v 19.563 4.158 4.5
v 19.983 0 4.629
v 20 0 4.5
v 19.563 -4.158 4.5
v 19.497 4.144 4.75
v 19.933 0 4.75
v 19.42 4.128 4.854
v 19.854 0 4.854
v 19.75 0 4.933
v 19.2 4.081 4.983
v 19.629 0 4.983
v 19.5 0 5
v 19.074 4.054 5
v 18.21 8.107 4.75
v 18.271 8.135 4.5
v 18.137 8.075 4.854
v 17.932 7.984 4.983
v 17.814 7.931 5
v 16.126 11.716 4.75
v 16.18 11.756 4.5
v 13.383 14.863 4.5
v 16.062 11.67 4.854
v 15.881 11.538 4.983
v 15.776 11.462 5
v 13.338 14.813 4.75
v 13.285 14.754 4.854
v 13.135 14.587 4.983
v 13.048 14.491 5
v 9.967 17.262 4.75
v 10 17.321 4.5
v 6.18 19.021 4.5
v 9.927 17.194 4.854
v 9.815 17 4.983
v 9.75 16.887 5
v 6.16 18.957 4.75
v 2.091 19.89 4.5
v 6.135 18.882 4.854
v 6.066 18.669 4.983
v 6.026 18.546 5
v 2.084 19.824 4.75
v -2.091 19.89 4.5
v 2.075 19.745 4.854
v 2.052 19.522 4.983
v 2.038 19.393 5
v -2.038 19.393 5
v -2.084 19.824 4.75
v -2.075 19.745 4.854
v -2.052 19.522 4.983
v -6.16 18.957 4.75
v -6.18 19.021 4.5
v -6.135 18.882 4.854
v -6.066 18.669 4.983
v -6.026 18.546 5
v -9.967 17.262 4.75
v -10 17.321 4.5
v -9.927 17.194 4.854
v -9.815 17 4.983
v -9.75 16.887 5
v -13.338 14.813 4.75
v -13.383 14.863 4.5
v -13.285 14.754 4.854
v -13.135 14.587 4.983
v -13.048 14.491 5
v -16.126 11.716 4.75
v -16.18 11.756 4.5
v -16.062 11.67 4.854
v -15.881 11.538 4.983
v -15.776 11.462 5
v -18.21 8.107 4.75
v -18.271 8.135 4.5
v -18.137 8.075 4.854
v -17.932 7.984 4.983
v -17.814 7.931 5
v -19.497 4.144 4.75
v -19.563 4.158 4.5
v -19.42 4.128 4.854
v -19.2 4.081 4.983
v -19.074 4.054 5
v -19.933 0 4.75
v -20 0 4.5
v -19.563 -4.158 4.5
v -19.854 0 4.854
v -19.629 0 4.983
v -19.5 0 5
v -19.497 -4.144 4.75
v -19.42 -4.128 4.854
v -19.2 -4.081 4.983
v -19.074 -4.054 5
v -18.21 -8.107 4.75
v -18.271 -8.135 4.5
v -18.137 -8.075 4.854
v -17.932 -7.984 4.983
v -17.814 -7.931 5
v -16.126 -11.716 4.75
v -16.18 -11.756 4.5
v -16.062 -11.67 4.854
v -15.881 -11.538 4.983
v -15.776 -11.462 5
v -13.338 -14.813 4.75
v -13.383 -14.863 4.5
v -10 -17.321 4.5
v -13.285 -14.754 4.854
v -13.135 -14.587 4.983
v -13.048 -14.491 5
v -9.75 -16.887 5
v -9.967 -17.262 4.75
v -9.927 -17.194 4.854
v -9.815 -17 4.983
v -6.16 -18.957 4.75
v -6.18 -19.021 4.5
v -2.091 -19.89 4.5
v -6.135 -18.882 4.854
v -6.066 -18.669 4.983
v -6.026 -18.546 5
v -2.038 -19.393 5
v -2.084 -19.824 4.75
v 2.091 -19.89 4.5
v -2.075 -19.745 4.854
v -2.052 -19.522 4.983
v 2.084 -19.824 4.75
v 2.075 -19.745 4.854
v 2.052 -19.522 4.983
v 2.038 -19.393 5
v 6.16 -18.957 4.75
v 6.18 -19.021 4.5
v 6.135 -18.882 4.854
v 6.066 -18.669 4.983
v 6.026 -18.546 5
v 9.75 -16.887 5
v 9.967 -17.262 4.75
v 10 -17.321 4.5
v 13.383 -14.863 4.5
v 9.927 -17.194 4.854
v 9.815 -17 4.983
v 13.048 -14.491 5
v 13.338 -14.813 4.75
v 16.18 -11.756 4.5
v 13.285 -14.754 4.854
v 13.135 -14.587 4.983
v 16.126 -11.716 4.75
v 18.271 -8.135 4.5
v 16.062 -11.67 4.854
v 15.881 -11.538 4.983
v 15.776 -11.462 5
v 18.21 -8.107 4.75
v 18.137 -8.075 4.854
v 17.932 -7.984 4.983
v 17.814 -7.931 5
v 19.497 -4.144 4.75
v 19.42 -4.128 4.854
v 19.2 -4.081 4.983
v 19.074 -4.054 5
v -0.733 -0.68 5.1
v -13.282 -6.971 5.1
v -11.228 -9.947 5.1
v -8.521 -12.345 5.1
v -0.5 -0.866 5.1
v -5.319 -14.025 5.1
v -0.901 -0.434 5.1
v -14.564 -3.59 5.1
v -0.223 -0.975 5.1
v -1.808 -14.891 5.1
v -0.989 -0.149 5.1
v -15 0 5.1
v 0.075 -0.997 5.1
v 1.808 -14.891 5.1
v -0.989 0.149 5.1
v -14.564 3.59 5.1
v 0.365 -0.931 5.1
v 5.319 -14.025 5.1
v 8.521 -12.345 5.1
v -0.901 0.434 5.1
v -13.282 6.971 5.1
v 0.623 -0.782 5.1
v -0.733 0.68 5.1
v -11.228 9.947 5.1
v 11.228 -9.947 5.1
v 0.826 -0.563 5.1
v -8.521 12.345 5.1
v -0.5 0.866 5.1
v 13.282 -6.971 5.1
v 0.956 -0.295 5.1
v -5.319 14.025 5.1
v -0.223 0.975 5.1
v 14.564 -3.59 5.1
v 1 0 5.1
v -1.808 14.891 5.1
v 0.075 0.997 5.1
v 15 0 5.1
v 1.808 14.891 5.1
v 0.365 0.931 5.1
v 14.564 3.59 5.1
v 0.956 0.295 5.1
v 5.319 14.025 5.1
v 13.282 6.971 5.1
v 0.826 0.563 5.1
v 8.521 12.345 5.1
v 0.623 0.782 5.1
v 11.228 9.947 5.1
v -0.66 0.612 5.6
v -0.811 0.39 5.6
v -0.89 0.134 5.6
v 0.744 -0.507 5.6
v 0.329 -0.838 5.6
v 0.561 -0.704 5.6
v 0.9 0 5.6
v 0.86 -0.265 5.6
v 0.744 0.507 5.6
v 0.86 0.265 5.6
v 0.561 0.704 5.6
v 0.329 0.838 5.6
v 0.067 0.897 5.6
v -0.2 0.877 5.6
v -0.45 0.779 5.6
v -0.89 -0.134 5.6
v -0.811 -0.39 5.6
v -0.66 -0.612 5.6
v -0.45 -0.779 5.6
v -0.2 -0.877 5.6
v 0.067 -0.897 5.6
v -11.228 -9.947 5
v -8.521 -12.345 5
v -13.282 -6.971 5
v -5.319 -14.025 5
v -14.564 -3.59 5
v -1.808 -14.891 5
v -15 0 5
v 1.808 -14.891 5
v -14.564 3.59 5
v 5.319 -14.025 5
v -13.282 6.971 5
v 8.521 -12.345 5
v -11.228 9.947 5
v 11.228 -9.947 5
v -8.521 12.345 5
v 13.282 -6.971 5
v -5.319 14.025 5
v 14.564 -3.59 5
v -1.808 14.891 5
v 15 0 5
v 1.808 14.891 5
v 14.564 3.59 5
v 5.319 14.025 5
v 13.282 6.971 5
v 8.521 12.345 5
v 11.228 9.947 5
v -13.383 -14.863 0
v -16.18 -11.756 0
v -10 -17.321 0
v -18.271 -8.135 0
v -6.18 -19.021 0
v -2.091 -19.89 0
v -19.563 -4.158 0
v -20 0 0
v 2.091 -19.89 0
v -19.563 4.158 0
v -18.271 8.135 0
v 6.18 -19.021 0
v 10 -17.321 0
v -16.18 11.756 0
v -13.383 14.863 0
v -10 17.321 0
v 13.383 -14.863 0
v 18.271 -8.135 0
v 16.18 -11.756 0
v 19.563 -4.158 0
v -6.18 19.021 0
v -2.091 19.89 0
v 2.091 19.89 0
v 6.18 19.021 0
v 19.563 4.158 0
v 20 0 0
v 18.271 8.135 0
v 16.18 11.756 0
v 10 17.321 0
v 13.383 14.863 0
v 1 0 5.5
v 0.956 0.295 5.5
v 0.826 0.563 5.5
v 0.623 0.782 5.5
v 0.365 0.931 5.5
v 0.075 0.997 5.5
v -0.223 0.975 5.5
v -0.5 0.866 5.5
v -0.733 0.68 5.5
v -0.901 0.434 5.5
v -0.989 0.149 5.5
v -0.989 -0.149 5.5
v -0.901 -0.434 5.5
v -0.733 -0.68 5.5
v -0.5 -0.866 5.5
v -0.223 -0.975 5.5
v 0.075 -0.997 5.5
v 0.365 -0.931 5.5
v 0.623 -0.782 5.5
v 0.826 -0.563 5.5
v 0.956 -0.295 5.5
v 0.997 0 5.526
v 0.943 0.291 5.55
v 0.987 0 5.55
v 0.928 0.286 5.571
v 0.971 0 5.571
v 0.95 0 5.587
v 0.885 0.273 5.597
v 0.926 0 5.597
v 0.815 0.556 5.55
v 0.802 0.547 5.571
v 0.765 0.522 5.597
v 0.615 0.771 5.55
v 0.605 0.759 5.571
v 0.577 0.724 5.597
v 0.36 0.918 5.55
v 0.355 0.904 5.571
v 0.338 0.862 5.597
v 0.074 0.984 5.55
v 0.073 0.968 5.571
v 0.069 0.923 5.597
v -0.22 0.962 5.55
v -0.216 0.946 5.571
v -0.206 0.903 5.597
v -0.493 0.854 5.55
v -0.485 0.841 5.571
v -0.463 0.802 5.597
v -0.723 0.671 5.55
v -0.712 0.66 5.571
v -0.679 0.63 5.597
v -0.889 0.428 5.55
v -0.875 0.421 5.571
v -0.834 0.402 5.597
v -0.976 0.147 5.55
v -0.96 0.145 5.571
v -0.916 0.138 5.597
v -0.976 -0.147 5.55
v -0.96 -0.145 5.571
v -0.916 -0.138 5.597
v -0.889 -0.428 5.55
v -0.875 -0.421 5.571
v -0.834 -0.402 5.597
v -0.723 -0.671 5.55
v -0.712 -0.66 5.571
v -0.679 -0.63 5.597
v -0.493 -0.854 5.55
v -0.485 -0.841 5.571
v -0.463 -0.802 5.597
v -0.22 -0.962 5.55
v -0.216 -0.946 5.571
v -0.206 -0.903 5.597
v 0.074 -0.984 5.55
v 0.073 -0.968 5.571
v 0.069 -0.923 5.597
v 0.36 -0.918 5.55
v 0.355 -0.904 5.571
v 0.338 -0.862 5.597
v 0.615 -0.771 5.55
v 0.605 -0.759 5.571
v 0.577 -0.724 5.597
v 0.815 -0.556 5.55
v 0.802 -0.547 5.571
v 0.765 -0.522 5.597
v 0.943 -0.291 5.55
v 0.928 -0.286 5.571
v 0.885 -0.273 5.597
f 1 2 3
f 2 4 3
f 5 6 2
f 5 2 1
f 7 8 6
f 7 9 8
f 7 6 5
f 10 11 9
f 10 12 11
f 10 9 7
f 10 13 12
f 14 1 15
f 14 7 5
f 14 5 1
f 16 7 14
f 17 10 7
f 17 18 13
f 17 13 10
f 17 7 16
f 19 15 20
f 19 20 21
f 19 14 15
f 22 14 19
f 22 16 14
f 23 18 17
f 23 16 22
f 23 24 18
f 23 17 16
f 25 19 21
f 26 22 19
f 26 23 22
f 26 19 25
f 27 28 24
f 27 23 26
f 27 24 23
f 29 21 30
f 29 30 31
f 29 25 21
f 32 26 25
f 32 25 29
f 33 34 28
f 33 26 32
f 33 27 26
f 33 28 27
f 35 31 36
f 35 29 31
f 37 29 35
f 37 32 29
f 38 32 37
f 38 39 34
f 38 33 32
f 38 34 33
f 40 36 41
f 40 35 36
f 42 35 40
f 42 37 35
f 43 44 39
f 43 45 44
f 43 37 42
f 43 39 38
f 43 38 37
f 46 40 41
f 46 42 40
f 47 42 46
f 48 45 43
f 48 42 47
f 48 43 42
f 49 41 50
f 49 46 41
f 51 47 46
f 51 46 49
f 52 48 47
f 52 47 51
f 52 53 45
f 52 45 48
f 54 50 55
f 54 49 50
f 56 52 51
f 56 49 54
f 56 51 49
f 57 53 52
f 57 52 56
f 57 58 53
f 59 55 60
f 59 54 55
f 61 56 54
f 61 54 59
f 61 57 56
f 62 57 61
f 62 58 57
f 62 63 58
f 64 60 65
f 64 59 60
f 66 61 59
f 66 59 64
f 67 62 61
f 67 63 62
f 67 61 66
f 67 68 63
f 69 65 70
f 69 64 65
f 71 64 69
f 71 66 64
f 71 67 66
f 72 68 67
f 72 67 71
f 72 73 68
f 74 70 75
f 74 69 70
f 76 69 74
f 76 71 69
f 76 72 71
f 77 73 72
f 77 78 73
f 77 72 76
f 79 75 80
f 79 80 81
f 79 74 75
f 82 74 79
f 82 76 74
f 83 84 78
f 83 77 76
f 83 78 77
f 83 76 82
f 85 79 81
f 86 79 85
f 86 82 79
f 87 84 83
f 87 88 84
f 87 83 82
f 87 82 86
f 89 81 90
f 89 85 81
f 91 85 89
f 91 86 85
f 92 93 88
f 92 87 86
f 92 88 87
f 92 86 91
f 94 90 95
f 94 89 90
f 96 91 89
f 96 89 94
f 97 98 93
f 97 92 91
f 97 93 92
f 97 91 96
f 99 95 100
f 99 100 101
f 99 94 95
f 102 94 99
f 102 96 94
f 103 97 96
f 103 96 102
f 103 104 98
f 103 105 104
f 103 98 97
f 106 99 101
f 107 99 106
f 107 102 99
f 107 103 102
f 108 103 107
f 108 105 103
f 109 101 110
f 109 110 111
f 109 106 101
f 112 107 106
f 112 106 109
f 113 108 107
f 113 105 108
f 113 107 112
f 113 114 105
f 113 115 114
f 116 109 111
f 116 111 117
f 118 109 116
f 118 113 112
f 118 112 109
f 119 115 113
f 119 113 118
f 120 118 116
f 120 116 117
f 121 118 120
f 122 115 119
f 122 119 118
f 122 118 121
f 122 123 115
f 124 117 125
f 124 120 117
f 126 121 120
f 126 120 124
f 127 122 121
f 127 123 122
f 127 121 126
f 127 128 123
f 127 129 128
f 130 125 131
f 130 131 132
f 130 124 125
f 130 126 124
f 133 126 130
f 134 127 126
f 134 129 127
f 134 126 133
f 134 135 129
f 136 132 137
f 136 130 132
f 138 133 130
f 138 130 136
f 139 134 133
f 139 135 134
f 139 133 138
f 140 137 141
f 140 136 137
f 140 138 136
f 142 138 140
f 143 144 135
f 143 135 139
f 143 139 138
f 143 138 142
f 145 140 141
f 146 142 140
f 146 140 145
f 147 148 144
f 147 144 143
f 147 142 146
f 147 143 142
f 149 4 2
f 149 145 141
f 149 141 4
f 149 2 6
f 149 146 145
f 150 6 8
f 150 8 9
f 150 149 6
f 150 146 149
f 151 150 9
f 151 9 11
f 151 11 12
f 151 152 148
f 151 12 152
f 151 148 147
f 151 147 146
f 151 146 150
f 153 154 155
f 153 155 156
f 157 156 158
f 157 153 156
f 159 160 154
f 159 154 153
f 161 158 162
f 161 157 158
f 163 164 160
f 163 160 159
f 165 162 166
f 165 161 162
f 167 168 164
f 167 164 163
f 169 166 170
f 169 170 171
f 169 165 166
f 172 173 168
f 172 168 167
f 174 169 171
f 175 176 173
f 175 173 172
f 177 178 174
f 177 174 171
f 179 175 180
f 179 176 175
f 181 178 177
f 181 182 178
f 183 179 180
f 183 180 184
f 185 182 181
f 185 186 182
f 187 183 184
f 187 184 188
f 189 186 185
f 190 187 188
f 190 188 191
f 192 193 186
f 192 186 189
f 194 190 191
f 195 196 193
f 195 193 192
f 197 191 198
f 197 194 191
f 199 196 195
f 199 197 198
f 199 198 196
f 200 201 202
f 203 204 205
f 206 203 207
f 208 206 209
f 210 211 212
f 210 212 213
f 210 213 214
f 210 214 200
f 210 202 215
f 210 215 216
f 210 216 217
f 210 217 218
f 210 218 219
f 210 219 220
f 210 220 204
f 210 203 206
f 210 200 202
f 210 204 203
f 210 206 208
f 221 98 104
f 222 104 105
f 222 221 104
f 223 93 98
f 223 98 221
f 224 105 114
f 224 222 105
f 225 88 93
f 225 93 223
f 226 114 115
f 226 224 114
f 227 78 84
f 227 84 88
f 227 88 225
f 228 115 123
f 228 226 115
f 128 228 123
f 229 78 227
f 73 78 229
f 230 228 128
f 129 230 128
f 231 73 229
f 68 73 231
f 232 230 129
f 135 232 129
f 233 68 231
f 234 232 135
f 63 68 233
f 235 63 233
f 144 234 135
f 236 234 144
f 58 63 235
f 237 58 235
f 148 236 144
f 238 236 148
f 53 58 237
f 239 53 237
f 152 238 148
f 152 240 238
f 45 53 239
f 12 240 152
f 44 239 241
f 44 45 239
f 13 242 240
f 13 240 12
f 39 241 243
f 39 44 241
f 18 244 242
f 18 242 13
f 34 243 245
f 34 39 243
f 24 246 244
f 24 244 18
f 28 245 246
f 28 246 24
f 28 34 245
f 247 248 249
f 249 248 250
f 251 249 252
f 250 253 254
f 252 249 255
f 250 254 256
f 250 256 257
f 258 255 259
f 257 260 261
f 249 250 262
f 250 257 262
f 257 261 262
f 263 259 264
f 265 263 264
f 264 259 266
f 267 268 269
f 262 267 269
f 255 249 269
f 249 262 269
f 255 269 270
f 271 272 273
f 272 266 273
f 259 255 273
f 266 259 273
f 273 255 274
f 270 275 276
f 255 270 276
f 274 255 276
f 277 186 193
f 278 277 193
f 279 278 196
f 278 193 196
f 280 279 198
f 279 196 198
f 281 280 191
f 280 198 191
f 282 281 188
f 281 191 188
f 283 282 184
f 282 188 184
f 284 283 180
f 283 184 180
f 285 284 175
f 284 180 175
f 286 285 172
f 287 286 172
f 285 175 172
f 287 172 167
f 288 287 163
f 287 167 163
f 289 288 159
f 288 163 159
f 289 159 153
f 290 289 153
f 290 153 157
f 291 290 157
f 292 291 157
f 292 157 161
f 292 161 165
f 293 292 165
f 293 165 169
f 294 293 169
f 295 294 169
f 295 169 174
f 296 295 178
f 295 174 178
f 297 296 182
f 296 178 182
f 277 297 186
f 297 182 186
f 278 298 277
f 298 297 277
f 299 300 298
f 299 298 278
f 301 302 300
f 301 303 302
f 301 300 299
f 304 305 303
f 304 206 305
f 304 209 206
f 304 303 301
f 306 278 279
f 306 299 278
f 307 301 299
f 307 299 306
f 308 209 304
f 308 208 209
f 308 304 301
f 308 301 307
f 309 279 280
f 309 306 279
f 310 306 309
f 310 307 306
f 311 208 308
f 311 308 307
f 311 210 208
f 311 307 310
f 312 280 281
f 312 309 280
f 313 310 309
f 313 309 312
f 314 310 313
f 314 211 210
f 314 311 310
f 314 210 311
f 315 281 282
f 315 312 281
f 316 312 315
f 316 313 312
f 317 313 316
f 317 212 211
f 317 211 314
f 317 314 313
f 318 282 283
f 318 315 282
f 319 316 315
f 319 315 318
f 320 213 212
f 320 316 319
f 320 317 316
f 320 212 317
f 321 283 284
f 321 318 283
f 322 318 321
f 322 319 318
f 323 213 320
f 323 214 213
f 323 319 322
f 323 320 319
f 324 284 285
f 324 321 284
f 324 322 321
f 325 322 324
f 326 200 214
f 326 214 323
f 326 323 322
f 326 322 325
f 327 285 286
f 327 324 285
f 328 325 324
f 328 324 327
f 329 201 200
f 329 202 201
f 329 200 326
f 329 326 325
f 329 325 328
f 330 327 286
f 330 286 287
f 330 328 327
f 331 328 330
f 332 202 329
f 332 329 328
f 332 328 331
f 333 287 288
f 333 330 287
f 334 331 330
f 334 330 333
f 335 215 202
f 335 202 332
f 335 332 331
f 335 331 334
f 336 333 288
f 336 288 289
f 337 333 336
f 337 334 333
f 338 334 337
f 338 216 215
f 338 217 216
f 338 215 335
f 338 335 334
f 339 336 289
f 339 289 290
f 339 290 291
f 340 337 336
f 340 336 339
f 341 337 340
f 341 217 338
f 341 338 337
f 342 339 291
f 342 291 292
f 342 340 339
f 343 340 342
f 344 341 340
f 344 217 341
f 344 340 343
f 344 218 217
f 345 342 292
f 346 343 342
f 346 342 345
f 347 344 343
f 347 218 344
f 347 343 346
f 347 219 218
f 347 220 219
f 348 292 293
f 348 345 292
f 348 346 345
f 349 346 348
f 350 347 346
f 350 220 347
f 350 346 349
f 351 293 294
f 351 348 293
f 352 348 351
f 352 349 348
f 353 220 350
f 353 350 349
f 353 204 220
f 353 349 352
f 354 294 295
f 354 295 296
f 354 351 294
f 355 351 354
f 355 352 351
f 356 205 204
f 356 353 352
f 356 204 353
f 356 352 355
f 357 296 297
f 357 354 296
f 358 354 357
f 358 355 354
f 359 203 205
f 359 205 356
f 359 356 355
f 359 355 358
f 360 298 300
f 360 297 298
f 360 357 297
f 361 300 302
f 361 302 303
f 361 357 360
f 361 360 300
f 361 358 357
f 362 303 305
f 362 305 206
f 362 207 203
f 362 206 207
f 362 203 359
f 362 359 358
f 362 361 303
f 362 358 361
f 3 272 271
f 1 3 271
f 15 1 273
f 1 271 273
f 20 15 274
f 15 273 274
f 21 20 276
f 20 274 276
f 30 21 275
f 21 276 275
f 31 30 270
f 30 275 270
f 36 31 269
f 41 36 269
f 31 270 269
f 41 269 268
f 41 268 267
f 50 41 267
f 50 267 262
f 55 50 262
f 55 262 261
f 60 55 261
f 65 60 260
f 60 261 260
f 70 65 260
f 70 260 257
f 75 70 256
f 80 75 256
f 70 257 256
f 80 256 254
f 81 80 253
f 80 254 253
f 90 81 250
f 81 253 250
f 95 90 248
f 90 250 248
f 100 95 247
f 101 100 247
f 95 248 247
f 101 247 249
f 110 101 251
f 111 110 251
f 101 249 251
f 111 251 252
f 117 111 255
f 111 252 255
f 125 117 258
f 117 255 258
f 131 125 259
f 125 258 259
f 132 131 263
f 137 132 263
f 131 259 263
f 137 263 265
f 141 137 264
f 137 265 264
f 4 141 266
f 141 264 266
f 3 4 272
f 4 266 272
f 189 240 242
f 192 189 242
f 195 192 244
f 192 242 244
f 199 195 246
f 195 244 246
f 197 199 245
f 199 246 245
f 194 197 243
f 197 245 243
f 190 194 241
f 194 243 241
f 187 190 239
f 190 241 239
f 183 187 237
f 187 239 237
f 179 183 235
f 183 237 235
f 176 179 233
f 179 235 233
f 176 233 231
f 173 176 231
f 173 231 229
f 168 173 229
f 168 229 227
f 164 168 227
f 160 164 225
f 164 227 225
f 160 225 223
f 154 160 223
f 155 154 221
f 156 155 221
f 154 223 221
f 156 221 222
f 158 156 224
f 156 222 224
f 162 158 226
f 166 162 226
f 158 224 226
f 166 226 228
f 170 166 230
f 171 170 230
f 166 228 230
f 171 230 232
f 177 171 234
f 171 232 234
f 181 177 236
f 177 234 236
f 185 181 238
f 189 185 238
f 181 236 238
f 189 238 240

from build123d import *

# Parameters (mm, degrees)
F0_R     = 20
F1_DEPTH = 5
F2_R     = 15
F3_DEPTH = 0.1
F4_R     = 0.5
F5_R     = 1
F6_DEPTH = 0.5
F7_R     = 0.1


with BuildPart() as f1:
    # F0 (on Top) → F1 (new body)
    with BuildSketch(Plane.XY):
        Circle(F0_R)
    extrude(amount=F1_DEPTH)

    # F2 (on face) → F3 (join)
    with BuildSketch(Plane.XY.offset(5)):
        Circle(F2_R)
    extrude(amount=F3_DEPTH)

    # F4
    f4_edges = [f1.edges().sort_by_distance(p)[0] for p in [
        (-20, 0, 5),
    ]]
    fillet(f4_edges, radius=F4_R)

    # F5 (on face) → F6 (join)
    with BuildSketch(Plane.XY.offset(5.1)):
        Circle(F5_R)
    extrude(amount=F6_DEPTH)

    # F7
    f7_edges = [f1.edges().sort_by_distance(p)[0] for p in [
        (-1, 0, 5.6),
    ]]
    fillet(f7_edges, radius=F7_R)


solid = f1.part
